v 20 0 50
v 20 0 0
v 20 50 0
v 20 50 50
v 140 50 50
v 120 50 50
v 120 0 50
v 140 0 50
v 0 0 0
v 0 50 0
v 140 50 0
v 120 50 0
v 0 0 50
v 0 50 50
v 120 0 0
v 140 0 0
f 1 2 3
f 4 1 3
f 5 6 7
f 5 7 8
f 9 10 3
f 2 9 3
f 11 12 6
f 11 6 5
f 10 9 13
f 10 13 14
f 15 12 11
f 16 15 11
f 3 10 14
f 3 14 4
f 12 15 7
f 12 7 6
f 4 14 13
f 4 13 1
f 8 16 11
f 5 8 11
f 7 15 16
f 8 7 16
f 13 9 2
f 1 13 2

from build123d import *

# Parameters (mm, degrees)
SZKIC1_W                    = 20
SZKIC1_H                    = 50
DODANIE_WYCI_GNI_CIE1_DEPTH = 50
SZYK_LINIOWY1_COUNT         = 2
SZYK_LINIOWY1_PITCH         = 120


with BuildPart() as part:
    # Szkic1 → Dodanie-wyciągnięcie1 (new body)
    with BuildSketch(Plane.XY):
        with Locations((10, 25)):
            Rectangle(SZKIC1_W, SZKIC1_H)
    extrude(amount=DODANIE_WYCI_GNI_CIE1_DEPTH)


with BuildPart() as szyk_liniowy1_1:
    # Szyk liniowy1: pattern copy
    add(part.part.moved(Location(Vector(1, 0, 0) * (1 * SZYK_LINIOWY1_PITCH))))


solid = Compound([part.part, szyk_liniowy1_1.part])
